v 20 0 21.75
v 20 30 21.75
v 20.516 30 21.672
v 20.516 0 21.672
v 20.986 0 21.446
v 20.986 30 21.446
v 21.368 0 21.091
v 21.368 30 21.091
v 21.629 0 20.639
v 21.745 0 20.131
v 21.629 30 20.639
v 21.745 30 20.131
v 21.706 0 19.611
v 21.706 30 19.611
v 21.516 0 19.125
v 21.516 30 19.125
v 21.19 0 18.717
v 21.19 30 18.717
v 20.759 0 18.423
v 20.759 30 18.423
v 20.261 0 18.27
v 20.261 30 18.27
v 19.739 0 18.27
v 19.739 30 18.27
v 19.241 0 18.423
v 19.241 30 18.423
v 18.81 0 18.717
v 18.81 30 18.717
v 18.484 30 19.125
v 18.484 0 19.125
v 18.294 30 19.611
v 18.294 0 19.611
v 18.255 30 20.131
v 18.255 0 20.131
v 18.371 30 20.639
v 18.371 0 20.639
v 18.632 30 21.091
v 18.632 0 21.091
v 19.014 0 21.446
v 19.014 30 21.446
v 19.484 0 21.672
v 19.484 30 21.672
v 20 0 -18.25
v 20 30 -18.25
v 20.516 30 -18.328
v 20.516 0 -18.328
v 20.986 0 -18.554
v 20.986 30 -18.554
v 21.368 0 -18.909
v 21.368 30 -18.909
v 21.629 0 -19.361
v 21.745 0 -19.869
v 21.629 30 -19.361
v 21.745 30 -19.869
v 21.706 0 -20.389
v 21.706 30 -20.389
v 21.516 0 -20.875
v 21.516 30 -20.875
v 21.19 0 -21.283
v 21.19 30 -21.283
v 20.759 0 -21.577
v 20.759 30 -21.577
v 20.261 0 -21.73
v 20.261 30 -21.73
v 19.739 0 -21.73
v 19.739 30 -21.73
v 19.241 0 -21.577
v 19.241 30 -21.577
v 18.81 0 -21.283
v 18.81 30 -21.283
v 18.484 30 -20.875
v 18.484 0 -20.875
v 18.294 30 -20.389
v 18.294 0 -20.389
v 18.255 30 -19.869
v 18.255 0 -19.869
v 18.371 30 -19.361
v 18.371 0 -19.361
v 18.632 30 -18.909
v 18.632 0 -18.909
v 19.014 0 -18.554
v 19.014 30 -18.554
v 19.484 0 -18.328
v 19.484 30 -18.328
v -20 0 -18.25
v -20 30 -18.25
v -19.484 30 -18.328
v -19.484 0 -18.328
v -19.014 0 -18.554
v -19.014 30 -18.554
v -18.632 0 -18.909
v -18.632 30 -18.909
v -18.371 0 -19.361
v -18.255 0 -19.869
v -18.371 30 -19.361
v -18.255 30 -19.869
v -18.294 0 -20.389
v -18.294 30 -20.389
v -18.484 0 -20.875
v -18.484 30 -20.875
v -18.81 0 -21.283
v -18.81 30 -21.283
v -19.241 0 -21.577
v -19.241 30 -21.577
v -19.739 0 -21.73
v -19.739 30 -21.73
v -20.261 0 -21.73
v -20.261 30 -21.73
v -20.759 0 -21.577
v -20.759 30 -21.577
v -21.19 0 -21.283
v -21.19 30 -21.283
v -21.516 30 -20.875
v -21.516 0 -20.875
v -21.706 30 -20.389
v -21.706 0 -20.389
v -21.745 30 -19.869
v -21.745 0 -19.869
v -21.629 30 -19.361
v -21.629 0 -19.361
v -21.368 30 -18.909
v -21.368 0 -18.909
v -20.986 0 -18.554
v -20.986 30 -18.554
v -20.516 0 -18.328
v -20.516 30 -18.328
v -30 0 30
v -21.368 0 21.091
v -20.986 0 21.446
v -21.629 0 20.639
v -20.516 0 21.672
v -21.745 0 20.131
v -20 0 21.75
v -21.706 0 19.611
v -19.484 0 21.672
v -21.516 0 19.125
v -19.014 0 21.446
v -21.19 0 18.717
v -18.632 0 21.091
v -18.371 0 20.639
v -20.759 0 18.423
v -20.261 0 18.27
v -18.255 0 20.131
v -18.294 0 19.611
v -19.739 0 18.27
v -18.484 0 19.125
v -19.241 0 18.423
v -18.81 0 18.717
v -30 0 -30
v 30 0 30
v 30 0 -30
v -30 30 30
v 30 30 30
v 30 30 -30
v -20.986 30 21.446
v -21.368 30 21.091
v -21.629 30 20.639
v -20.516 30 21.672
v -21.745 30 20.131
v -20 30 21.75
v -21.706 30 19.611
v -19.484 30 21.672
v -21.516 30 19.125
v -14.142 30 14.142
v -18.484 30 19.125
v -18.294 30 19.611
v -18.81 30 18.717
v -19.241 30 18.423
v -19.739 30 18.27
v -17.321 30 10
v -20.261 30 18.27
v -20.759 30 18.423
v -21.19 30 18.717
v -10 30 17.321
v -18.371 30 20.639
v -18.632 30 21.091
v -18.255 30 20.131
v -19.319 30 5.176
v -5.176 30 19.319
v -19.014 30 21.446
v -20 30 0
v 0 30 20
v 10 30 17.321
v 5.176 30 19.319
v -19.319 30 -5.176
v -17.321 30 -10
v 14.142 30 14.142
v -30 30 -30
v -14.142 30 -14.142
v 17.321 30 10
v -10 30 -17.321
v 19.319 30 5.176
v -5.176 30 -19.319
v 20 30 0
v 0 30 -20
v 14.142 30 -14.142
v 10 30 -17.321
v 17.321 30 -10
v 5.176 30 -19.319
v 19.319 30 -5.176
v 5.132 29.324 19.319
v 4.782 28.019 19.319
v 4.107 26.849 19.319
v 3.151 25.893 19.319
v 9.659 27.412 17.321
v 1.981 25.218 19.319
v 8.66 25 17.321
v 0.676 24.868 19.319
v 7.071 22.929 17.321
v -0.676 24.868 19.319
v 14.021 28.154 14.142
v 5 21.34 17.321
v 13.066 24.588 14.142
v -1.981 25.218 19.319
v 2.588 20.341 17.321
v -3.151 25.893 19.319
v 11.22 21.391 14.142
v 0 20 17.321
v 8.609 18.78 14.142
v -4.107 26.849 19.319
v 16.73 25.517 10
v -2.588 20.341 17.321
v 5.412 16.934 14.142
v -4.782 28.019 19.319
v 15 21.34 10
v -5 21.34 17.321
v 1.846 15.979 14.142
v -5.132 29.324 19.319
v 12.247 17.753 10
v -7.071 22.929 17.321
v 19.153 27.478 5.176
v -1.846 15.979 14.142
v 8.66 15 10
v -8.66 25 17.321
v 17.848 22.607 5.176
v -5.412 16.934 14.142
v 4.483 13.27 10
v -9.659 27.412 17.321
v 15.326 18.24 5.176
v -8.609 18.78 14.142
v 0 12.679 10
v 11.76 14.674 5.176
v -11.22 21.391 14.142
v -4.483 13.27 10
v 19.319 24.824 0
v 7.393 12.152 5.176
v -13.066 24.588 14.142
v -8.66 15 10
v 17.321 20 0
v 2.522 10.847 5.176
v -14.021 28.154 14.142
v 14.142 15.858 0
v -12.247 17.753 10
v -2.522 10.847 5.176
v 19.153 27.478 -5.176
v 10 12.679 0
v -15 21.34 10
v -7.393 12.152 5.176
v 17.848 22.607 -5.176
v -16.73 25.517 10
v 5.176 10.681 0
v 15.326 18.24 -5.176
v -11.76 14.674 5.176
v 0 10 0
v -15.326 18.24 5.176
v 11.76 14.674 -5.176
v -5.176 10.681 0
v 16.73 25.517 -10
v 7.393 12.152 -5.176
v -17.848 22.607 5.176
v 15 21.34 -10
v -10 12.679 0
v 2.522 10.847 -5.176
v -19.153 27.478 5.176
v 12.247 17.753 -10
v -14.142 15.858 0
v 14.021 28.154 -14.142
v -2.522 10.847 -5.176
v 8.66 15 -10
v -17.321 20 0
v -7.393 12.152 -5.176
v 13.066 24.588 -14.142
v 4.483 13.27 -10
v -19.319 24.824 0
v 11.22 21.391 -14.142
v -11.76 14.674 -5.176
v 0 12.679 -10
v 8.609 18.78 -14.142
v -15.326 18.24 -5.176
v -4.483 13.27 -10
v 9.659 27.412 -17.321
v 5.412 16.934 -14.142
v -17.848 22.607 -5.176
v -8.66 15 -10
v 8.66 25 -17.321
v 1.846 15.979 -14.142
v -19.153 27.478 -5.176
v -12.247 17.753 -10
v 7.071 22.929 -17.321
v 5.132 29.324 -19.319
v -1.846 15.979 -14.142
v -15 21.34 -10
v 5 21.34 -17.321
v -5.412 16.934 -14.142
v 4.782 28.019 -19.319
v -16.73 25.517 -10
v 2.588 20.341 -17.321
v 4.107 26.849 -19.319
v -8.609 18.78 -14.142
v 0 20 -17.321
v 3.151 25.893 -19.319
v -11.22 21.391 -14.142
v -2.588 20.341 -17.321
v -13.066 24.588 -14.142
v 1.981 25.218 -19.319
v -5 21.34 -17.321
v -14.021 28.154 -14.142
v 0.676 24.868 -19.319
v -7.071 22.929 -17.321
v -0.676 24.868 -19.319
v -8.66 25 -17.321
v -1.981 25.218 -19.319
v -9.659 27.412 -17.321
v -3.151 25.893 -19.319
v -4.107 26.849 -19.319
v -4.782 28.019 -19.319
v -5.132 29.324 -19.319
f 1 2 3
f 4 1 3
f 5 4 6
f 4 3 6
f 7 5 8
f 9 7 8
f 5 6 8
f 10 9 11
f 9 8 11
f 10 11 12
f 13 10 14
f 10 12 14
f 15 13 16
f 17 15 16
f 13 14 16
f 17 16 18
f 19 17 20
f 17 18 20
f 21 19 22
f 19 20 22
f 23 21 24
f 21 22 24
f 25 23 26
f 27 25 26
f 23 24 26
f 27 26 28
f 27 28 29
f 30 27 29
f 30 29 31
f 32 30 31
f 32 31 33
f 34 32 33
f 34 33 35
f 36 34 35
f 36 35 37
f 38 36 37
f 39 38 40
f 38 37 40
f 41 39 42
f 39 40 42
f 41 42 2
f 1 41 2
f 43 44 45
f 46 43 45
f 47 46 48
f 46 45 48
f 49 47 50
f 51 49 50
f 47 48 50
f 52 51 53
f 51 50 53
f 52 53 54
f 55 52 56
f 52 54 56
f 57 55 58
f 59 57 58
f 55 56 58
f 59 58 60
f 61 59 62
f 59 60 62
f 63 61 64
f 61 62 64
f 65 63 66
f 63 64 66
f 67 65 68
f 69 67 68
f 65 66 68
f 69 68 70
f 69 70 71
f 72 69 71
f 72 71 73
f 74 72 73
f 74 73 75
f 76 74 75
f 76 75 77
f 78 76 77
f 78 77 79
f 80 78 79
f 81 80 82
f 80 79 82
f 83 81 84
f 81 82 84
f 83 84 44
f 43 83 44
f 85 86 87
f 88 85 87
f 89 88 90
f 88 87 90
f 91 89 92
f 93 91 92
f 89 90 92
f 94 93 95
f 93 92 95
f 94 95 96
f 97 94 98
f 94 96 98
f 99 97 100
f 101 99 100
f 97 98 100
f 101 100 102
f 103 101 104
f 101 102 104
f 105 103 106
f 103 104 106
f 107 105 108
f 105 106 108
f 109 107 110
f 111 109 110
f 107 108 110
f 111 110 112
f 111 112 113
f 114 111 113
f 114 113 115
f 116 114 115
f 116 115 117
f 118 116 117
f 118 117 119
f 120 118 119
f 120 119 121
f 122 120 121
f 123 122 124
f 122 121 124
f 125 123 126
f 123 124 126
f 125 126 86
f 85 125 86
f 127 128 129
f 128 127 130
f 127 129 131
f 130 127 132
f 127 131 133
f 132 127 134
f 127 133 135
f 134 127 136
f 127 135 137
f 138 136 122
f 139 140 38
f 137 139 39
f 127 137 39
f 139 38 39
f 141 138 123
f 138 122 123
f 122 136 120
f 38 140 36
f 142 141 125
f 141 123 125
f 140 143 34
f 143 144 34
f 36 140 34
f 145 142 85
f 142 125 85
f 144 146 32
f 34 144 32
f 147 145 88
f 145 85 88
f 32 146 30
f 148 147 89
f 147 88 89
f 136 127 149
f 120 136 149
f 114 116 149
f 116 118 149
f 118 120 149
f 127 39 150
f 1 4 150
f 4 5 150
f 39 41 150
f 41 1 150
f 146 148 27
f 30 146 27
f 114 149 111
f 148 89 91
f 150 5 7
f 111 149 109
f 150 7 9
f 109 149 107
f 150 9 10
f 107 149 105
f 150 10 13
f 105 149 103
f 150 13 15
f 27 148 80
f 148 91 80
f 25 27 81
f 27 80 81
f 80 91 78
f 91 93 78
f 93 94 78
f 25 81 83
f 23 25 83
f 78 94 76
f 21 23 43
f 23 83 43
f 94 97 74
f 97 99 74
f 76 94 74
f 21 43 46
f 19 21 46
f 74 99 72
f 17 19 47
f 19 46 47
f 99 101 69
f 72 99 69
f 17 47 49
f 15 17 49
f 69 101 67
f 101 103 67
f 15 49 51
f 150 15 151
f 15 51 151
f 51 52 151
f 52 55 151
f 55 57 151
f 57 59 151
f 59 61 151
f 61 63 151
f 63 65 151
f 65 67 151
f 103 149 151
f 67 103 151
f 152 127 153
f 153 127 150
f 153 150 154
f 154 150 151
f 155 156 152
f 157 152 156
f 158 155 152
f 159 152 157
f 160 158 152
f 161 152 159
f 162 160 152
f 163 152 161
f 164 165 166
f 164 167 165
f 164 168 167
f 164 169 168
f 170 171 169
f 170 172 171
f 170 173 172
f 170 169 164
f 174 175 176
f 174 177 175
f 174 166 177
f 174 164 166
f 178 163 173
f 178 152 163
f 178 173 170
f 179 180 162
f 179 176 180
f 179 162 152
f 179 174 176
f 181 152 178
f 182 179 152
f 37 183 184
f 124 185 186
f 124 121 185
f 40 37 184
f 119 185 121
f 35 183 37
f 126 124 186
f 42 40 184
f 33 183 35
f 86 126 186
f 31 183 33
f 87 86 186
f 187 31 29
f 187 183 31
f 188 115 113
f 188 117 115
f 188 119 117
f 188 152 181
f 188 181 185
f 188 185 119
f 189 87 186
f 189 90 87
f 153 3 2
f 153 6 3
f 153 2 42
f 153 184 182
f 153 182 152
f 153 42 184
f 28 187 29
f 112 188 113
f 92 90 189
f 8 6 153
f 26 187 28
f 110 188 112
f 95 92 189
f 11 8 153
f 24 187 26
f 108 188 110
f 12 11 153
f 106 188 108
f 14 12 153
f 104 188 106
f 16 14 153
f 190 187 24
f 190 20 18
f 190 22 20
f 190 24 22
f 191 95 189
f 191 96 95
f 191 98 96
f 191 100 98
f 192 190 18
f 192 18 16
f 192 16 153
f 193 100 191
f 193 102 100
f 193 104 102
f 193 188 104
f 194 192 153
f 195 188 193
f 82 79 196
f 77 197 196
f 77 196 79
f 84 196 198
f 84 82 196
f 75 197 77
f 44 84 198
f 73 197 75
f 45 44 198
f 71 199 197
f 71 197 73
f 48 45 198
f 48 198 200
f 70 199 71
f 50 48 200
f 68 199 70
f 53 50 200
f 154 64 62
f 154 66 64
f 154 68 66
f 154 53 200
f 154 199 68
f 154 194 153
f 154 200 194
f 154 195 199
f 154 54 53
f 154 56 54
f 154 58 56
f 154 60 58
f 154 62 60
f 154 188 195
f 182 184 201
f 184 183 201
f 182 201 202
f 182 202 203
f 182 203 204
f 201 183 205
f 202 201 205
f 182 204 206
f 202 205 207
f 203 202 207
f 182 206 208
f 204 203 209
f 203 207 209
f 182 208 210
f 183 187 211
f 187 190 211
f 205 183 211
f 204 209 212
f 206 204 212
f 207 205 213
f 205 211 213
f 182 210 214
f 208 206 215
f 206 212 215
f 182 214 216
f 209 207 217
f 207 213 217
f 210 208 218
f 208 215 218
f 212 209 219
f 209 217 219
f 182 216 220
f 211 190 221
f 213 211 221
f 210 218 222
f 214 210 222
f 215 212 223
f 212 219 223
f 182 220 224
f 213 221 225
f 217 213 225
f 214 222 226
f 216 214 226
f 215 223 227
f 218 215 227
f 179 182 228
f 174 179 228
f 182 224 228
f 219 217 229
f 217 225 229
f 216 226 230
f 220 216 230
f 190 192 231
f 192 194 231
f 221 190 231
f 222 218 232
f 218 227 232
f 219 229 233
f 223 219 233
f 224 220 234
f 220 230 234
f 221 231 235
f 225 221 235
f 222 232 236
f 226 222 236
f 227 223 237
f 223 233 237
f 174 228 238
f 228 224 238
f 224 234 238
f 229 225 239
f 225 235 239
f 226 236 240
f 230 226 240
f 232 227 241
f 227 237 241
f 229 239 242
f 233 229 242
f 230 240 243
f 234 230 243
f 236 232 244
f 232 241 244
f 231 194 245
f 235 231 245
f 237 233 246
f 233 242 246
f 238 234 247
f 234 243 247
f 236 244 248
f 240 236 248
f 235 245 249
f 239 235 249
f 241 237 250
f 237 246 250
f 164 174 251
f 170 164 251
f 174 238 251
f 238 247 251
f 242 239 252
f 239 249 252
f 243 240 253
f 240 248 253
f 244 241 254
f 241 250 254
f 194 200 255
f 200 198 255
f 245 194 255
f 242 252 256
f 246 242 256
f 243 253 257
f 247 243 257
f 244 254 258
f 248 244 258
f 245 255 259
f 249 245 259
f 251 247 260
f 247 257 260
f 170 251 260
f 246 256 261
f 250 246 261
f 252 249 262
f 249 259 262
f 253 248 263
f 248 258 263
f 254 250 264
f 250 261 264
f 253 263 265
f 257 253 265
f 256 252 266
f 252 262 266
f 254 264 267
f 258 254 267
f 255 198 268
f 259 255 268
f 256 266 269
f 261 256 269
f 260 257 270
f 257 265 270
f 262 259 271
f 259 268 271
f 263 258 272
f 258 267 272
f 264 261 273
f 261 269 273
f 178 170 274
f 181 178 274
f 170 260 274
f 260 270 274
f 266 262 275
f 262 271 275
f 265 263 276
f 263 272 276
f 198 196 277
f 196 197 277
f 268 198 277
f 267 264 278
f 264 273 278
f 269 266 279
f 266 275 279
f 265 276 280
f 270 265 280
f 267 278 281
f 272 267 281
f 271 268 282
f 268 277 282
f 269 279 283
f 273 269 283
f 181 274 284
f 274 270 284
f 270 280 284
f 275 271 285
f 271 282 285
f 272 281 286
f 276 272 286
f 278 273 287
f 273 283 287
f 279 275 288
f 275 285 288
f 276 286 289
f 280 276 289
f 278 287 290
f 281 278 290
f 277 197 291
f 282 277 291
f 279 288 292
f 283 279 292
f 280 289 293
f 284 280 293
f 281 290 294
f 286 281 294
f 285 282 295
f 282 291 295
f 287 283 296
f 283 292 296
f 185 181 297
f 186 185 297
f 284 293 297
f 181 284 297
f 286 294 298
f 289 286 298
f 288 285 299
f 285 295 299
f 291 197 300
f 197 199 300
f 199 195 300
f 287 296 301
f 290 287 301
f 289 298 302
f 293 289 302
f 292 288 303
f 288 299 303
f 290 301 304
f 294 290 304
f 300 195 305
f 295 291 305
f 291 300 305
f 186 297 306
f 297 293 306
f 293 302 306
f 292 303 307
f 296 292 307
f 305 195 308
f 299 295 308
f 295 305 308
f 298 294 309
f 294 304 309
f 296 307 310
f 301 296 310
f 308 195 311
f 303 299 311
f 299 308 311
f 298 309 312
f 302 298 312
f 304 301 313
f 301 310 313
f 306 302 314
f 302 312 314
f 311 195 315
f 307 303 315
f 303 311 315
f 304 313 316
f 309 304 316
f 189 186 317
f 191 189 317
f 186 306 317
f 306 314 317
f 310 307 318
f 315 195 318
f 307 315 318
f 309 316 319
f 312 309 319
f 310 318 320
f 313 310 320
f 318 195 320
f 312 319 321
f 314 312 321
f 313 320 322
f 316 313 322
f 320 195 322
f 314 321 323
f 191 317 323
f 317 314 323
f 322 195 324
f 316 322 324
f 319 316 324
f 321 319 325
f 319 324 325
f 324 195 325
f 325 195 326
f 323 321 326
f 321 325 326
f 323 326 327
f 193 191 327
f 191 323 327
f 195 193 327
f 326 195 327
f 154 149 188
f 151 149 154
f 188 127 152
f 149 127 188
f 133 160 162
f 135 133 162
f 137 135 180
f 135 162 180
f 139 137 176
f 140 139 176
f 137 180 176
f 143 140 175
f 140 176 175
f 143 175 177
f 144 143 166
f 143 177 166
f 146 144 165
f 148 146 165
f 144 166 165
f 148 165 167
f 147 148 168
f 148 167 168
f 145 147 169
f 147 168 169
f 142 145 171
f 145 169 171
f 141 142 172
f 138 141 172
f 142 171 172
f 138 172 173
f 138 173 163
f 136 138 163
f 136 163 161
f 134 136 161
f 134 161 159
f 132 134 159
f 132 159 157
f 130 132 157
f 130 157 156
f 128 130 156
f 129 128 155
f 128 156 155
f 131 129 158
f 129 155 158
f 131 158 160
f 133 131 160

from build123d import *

# Parameters (mm, degrees)
SKETCH1_W           = 60
SKETCH1_H           = 60
BOSS_EXTRUDE1_DEPTH = 30
CUT_REVOLVE1_ANGLE  = 180
SKETCH3_R           = 1.75
CUT_EXTRUDE1_DEPTH  = 30


with BuildPart() as part:
    # Sketch1 → Boss-Extrude1 (new body)
    with BuildSketch(Plane(origin=(0, 0, 0), x_dir=(1, 0, 0), z_dir=(0, 1, 0))):
        Rectangle(SKETCH1_W, SKETCH1_H)
    extrude(amount=BOSS_EXTRUDE1_DEPTH)

    # Sketch2 → Cut-Revolve1 (revolve, cut)
    with BuildSketch(Plane(origin=(0, 30, 0), x_dir=(1, 0, 0), z_dir=(0, 1, 0))):
        with BuildLine():
            Line((0, 20), (0, -20))
            ThreePointArc((0, -20), (20, 0), (0, 20))
        make_face()
    revolve(axis=Axis((0, 30, -20), (0, 0, -1)), revolution_arc=CUT_REVOLVE1_ANGLE, mode=Mode.SUBTRACT)

    # Sketch3 → Cut-Extrude1 (cut)
    with BuildSketch(Plane(origin=(0, 30, 0), x_dir=(1, 0, 0), z_dir=(0, 1, 0))):
        with Locations(Location((-20, 20, 0), (0, 0, 270))):
            Circle(SKETCH3_R)
        with Locations(Location((-20, -20, 0), (0, 0, 270))):
            Circle(SKETCH3_R)
        with Locations(Location((20, 20, 0), (0, 0, 270))):
            Circle(SKETCH3_R)
        with Locations(Location((20, -20, 0), (0, 0, 270))):
            Circle(SKETCH3_R)
    extrude(amount=-CUT_EXTRUDE1_DEPTH, mode=Mode.SUBTRACT)


solid = part.part
